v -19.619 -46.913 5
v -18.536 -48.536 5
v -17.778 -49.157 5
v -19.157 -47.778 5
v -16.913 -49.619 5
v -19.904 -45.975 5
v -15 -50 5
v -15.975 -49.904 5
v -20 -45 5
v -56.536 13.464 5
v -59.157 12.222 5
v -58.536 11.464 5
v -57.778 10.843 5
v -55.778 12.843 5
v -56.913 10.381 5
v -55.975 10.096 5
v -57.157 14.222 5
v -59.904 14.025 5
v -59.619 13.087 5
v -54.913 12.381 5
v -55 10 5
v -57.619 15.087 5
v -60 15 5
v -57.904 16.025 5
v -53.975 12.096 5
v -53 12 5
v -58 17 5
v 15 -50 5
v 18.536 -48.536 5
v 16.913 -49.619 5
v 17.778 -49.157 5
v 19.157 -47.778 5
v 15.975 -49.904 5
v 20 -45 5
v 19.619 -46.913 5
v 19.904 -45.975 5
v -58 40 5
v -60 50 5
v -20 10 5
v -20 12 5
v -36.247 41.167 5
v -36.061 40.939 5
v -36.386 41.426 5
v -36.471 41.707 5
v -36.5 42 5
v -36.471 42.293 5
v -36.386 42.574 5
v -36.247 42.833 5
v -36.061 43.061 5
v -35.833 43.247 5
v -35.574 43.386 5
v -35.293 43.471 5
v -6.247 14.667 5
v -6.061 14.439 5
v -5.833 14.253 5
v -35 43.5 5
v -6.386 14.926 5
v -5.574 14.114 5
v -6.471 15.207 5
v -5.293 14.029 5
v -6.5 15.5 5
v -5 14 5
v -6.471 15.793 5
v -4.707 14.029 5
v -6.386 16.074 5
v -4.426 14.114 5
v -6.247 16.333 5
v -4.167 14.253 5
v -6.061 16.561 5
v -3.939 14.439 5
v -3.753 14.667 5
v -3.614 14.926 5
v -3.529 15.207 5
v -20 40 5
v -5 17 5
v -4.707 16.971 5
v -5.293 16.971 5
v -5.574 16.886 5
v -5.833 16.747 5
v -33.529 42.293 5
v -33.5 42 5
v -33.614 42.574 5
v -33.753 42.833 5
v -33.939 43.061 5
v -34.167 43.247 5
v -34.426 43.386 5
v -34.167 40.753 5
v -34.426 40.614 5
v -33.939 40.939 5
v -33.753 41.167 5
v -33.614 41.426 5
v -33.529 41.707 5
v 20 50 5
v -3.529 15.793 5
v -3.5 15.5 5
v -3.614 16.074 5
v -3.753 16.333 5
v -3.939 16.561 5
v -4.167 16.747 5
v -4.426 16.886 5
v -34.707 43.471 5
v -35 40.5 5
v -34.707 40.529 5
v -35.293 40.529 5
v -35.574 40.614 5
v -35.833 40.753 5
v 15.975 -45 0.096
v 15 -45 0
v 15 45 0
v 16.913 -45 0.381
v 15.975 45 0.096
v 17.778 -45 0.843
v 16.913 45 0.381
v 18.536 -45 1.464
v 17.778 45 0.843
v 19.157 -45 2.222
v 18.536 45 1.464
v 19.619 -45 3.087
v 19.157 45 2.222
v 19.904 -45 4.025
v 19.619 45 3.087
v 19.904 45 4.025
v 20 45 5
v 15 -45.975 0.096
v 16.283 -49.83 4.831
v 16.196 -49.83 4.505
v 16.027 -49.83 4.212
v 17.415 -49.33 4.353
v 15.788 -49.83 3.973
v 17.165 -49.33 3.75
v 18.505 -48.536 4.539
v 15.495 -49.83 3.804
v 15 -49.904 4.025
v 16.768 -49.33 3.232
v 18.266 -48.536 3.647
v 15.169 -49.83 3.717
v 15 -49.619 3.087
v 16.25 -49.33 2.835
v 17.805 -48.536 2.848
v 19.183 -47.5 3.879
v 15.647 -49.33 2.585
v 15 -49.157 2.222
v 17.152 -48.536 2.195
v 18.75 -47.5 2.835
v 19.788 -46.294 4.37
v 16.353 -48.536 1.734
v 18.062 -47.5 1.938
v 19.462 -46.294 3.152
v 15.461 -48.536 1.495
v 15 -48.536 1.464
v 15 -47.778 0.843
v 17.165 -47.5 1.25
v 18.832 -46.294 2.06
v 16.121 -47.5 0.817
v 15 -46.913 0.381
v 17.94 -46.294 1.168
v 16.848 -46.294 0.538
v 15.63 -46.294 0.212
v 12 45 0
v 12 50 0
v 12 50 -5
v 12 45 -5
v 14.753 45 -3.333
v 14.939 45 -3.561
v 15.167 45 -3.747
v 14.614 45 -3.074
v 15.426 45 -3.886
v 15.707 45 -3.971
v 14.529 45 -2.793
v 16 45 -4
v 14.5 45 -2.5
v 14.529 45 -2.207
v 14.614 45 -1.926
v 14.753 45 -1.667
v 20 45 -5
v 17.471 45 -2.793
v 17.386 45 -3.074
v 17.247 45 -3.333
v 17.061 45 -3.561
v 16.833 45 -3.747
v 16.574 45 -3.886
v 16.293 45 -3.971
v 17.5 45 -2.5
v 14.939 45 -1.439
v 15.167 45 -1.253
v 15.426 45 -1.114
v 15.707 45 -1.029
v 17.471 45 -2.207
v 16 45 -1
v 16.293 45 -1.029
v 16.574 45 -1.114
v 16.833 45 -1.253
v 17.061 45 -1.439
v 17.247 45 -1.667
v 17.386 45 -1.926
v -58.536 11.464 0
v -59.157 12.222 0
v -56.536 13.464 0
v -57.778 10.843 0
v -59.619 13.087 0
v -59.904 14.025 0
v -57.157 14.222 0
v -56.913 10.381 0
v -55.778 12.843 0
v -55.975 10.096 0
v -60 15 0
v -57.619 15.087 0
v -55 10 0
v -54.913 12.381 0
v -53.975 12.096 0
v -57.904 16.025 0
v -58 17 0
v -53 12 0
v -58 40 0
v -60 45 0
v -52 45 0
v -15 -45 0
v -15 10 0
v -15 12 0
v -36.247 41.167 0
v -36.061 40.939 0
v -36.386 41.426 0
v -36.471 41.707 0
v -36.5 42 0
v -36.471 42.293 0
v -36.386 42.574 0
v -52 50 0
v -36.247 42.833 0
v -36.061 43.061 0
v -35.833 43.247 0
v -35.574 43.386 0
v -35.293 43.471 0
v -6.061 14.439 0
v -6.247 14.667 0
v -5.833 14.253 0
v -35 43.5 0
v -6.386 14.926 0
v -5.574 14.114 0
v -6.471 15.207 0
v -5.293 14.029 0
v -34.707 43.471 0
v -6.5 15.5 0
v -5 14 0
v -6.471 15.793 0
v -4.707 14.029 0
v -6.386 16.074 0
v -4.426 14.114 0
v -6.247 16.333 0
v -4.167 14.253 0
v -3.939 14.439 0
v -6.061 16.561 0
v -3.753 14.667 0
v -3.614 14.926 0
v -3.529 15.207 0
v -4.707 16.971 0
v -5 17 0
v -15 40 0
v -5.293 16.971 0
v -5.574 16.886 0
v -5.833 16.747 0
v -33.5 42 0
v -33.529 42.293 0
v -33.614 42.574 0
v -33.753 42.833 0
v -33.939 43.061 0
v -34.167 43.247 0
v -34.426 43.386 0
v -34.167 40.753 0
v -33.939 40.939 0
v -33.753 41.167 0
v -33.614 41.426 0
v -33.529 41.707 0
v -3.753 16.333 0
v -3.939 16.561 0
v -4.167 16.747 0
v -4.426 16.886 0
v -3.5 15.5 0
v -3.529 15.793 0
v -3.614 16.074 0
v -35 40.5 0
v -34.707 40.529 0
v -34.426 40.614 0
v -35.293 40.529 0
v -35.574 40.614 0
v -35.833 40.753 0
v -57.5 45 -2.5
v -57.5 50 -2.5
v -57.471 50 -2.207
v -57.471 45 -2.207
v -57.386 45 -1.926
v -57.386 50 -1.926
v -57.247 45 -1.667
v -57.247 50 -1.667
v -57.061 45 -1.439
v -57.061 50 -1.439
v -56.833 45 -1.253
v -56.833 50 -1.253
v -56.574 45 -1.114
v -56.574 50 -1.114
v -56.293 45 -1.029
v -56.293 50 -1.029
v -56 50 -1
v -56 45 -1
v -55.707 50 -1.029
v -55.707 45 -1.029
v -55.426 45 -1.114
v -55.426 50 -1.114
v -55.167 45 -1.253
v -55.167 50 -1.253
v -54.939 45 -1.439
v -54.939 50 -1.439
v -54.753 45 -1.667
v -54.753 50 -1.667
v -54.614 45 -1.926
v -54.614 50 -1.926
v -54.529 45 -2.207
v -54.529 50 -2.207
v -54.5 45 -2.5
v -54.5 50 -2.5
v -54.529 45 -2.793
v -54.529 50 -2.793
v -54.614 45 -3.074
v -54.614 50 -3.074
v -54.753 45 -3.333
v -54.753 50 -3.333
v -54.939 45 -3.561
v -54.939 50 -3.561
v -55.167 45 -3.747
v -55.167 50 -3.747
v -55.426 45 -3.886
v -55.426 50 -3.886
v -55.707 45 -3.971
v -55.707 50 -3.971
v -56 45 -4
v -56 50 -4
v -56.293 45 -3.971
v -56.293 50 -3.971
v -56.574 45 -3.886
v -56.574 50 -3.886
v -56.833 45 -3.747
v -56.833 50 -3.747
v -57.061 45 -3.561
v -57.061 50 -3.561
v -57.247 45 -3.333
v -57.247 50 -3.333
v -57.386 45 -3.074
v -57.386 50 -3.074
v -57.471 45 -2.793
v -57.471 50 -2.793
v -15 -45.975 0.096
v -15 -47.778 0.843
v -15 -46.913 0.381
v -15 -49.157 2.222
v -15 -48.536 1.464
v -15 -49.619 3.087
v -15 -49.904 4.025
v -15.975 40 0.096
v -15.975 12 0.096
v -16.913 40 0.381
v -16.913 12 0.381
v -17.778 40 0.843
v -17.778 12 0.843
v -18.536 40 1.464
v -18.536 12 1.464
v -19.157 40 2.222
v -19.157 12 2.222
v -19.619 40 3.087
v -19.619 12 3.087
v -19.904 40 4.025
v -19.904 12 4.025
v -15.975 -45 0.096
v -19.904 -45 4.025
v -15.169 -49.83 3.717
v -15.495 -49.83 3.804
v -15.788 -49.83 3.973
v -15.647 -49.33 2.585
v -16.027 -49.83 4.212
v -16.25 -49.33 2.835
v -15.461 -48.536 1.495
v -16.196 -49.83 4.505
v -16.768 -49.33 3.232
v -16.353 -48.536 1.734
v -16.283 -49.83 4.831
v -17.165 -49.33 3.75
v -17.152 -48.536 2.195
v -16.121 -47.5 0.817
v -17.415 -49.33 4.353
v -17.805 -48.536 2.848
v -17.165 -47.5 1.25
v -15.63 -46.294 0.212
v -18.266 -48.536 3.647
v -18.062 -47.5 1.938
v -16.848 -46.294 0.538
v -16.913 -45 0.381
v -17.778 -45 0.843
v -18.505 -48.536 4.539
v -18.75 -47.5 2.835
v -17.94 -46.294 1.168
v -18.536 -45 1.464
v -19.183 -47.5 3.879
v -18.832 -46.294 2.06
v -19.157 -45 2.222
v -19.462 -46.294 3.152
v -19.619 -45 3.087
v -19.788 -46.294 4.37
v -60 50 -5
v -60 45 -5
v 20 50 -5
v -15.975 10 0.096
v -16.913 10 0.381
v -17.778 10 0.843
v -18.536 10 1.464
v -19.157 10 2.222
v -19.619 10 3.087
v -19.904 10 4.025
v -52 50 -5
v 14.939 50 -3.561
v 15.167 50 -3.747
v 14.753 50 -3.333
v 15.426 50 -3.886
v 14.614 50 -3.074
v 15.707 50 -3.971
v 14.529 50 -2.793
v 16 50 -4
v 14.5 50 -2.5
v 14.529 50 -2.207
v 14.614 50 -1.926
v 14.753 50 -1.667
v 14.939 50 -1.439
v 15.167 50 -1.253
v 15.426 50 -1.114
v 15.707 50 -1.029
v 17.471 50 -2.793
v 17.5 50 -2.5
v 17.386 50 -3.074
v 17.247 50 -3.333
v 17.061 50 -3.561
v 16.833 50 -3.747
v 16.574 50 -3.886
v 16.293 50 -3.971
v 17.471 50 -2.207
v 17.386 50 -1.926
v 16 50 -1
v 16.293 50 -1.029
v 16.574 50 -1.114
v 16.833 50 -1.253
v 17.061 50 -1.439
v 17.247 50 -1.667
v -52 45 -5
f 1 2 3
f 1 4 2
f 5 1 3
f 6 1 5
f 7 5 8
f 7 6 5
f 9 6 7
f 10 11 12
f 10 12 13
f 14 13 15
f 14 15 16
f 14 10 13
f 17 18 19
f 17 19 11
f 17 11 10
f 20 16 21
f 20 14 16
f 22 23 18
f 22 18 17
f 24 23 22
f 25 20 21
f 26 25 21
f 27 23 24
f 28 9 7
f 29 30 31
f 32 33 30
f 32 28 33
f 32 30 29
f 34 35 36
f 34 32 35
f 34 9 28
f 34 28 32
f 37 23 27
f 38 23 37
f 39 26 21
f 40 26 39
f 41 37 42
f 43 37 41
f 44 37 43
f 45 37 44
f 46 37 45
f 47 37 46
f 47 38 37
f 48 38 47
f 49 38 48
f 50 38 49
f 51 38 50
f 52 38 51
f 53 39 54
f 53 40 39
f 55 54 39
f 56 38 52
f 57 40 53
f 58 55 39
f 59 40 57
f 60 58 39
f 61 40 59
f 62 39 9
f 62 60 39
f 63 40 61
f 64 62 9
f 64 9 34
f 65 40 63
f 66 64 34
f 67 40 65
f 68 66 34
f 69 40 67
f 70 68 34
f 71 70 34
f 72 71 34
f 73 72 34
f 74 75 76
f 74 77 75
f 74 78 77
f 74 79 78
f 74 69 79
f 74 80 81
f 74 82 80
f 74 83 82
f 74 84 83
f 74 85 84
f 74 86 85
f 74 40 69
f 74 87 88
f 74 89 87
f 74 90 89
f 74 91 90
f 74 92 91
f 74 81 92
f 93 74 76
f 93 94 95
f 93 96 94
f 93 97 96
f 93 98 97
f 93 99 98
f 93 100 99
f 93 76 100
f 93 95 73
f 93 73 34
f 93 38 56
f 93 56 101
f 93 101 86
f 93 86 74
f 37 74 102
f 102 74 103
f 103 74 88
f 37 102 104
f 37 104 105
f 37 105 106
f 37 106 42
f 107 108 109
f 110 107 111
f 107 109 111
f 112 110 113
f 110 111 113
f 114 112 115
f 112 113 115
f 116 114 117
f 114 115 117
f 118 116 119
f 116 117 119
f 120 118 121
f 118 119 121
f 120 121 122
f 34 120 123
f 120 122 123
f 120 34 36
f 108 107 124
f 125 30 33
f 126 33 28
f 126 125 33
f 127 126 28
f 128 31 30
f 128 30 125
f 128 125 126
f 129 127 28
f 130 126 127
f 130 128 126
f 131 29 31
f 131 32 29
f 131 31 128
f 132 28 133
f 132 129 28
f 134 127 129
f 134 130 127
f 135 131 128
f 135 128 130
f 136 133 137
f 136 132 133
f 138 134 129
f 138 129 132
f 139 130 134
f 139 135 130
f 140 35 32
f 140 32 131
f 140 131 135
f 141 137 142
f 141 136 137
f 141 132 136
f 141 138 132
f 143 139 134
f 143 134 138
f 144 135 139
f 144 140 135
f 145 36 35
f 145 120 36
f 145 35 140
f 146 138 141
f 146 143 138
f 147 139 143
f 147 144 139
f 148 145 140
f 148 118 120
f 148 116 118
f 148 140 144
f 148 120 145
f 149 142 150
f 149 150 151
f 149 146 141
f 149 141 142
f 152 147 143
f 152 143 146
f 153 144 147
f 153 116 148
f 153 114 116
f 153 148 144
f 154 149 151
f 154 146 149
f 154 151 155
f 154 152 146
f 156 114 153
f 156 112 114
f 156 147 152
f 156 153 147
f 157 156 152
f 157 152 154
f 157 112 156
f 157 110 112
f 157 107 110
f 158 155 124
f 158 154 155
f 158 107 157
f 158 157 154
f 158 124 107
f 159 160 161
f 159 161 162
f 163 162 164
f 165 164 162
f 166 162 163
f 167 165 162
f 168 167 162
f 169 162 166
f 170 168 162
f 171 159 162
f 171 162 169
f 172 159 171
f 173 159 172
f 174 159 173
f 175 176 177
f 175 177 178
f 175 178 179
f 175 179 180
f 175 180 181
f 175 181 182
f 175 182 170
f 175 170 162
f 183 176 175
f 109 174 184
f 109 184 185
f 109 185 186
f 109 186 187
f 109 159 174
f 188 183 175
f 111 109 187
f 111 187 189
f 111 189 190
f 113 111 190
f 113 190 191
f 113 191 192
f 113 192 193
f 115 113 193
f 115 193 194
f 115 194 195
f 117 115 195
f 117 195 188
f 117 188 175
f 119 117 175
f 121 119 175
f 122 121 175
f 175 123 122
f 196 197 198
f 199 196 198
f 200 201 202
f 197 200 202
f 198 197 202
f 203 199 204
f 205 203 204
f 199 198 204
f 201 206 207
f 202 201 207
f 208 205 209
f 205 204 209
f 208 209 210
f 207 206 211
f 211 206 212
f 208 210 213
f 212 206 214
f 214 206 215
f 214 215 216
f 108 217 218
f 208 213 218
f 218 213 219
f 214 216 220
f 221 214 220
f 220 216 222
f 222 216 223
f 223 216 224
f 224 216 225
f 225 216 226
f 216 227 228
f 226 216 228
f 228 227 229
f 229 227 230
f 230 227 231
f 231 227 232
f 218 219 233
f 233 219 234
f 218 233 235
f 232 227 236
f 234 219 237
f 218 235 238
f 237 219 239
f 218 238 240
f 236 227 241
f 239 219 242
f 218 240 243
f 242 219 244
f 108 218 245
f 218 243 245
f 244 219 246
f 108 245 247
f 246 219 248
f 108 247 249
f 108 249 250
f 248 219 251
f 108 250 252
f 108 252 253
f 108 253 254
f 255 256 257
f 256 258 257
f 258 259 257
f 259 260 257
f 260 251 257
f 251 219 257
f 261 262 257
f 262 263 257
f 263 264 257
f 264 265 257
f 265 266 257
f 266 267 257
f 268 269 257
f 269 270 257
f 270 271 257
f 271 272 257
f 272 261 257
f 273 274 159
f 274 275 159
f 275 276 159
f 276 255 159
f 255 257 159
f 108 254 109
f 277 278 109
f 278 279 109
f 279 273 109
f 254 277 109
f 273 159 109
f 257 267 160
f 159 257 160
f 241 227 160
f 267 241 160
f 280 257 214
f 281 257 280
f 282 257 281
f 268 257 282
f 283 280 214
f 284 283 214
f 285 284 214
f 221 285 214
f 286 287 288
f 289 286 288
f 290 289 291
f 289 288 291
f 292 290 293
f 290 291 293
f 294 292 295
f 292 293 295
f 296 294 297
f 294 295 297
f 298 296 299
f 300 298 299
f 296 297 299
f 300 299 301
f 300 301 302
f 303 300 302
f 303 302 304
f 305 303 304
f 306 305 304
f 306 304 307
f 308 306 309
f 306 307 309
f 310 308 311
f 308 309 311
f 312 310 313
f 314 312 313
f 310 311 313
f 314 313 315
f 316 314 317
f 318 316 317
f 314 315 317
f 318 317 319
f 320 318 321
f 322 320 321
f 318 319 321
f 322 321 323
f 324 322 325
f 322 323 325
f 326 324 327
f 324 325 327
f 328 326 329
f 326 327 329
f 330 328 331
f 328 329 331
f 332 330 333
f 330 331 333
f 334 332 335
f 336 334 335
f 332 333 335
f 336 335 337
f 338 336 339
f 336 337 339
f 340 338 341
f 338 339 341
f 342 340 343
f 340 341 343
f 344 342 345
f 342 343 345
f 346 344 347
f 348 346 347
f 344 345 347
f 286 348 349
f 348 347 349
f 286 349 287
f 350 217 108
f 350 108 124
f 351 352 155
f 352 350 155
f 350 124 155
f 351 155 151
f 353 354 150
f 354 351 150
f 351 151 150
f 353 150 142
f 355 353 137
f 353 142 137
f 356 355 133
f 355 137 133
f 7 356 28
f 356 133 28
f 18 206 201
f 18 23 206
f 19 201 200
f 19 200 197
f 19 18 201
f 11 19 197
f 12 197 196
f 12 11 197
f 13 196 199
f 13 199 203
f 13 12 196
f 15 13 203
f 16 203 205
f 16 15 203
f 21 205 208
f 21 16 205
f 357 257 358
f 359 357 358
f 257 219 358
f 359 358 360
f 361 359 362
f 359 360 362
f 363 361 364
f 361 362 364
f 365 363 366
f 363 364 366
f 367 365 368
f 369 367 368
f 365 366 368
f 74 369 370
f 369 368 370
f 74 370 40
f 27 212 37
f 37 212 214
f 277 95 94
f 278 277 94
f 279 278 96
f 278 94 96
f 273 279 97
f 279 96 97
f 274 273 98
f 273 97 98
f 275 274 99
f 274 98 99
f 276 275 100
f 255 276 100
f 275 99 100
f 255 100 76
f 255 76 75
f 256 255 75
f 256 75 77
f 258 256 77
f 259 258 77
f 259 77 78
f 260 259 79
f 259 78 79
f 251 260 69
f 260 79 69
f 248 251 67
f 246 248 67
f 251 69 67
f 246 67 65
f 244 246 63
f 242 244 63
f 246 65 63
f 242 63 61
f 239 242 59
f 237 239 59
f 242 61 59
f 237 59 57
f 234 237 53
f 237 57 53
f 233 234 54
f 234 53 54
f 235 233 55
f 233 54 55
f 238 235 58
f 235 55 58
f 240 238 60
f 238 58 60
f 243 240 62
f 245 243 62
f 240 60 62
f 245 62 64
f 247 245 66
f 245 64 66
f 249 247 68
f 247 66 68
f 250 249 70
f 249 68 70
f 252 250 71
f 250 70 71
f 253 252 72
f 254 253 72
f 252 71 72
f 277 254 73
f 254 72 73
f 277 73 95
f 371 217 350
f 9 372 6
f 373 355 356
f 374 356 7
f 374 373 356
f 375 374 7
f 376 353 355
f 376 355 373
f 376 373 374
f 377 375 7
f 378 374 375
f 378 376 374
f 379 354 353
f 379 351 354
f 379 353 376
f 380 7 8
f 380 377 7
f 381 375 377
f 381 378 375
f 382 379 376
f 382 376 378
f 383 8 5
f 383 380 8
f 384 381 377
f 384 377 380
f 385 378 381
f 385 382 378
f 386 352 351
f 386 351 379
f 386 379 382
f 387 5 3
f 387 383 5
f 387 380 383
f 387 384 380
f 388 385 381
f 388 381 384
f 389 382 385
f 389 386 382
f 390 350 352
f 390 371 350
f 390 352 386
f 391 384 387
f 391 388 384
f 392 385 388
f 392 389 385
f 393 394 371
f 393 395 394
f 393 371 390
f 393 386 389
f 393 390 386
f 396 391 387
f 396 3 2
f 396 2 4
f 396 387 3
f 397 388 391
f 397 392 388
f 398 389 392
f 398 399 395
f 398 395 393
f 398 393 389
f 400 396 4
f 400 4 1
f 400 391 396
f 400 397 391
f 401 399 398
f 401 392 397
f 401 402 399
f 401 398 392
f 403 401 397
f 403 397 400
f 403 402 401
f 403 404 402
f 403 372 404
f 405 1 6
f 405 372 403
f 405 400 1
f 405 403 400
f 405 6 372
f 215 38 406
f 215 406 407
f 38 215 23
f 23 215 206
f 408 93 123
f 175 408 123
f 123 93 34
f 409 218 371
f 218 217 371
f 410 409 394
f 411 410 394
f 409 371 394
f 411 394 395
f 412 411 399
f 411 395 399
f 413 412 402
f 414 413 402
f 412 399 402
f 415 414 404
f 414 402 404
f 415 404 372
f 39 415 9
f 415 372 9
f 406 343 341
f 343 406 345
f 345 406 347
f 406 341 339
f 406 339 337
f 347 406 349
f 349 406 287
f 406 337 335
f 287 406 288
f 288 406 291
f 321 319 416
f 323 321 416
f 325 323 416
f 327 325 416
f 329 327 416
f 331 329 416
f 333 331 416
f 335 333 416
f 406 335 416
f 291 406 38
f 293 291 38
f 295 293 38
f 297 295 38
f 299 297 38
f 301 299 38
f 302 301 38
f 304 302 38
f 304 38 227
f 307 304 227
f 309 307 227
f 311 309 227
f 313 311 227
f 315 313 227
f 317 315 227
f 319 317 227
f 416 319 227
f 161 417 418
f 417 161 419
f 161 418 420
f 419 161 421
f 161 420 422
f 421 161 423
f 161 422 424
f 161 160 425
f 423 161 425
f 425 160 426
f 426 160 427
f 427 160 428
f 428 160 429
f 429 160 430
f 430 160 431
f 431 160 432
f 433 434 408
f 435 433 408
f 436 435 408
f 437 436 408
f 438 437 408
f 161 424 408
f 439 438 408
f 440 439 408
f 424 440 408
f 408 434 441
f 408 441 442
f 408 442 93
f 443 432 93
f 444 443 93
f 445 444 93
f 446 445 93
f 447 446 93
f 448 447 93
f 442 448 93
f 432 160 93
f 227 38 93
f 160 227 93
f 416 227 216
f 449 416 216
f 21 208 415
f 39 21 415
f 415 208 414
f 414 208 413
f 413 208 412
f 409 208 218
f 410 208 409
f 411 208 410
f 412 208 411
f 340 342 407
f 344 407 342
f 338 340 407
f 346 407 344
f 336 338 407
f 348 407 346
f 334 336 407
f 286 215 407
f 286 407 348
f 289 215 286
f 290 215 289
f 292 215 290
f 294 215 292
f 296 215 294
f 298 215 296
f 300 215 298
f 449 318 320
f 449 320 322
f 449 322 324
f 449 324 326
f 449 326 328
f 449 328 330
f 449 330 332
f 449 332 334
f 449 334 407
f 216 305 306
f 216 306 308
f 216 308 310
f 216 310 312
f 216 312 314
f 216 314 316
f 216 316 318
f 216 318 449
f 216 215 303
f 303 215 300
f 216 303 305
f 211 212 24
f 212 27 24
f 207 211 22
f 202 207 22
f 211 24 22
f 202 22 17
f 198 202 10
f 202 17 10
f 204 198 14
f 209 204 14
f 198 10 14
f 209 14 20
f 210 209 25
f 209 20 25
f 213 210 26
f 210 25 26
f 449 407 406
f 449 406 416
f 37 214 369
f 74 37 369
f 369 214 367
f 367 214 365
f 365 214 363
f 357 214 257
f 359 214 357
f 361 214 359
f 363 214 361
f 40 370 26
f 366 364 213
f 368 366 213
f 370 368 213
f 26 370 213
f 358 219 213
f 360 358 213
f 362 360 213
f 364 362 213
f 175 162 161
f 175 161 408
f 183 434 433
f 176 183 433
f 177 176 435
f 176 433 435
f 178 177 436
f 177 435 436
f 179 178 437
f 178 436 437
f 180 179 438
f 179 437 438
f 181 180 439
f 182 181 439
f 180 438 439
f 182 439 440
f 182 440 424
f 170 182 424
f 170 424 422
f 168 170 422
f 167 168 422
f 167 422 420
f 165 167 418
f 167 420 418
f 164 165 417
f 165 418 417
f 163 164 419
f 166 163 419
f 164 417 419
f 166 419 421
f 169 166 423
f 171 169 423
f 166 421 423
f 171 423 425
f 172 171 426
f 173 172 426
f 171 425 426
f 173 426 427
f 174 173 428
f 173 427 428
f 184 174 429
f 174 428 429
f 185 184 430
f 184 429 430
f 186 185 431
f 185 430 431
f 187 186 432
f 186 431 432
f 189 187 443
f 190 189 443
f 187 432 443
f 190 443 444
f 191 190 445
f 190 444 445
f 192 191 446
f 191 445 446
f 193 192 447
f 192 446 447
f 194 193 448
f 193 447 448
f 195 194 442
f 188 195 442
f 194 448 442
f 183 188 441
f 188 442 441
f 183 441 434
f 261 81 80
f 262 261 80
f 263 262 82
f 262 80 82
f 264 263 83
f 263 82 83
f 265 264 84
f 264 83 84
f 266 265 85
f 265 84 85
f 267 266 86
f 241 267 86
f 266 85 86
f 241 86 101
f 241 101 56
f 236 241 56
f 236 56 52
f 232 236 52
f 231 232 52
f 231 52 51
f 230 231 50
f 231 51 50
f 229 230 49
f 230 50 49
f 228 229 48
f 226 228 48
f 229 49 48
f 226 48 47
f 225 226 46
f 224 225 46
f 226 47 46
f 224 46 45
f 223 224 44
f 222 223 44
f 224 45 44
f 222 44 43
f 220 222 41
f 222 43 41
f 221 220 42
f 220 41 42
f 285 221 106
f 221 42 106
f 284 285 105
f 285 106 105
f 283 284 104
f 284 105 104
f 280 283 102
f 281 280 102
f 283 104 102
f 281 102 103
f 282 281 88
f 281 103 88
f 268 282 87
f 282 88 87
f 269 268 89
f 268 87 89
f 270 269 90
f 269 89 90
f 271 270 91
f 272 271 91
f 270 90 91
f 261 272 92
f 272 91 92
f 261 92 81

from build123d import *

# Parameters (mm, degrees)
F0_W     = 38
F0_H     = 10
F1_DEPTH = 5
F2_R     = 1.5
F3_DEPTH = 5
F4_W     = 8
F4_H     = 5
F5_DEPTH = 5
F6_R     = 1.5
F7_DEPTH = 5
F8_R     = 4.99999


# Not quite as in the source:
# - a fillet or chamfer is up to 0.001 mm smaller than in the source, because OpenCascade refuses the exact size
# - a feature names something its author has since deleted; it is built from what else it names


with BuildPart() as f1:
    # F0 (on Top) → F1 (new body)
    with BuildSketch(Plane.XY):
        Polygon((20, -50), (20, 50), (-20, 50), (-20, 40), (-20, 12), (-20, 10), (-20, -50), align=None)
        with Locations((-39, 45)):
            Rectangle(F0_W, F0_H)
        Polygon((-58, 40), (-58, 50), (-60, 50), (-60, 10), (-20, 10), (-20, 12), (-58, 12), align=None)
    extrude(amount=F1_DEPTH)

    # F2 (on face) → F3 (cut)
    with BuildSketch(Plane.XY.offset(5)):
        with Locations((-35, 42)):
            Circle(F2_R)
        with Locations((-5, 15.5)):
            Circle(F2_R)
    extrude(amount=-F3_DEPTH, mode=Mode.SUBTRACT)

    # F4 (on face) → F5 (join)
    with BuildSketch(Plane(origin=(0, 0, 0), x_dir=(1, 0, 0), z_dir=(0, 0, -1))):
        with Locations((16, -47.5)):
            Rectangle(F4_W, F4_H)
        with Locations((-56, -47.5)):
            Rectangle(F4_W, F4_H)
    extrude(amount=F5_DEPTH)

    # F6 (on face) → F7 (cut)
    with BuildSketch(Plane(origin=(0, 50, 0), x_dir=(-1, 0, 0), z_dir=(0, 1, 0))):
        with BuildLine():
            ThreePointArc((-14.5, -2.5), (-16, -1), (-17.5, -2.5))
            ThreePointArc((-17.5, -2.5), (-16, -4), (-14.5, -2.5))
        make_face()
        with Locations((56, -2.5)):
            Circle(F6_R)
    extrude(amount=-F7_DEPTH, mode=Mode.SUBTRACT)

    # F8 (radius 5 in the source; OpenCascade refuses exactly that, so slightly less here)
    f8_edges = [f1.edges().sort_by_distance(p)[0] for p in [
        (20, -2.5, 0),
        (-20, 26, 0),
        (-20, -20, 0),
        (20, -50, 2.5),
        (0, -50, 0),
        (-20, -50, 2.5),
        (-58, 12, 2.5),
        (-60, 10, 2.5),
    ]]
    fillet(f8_edges, radius=F8_R)


solid = f1.part
